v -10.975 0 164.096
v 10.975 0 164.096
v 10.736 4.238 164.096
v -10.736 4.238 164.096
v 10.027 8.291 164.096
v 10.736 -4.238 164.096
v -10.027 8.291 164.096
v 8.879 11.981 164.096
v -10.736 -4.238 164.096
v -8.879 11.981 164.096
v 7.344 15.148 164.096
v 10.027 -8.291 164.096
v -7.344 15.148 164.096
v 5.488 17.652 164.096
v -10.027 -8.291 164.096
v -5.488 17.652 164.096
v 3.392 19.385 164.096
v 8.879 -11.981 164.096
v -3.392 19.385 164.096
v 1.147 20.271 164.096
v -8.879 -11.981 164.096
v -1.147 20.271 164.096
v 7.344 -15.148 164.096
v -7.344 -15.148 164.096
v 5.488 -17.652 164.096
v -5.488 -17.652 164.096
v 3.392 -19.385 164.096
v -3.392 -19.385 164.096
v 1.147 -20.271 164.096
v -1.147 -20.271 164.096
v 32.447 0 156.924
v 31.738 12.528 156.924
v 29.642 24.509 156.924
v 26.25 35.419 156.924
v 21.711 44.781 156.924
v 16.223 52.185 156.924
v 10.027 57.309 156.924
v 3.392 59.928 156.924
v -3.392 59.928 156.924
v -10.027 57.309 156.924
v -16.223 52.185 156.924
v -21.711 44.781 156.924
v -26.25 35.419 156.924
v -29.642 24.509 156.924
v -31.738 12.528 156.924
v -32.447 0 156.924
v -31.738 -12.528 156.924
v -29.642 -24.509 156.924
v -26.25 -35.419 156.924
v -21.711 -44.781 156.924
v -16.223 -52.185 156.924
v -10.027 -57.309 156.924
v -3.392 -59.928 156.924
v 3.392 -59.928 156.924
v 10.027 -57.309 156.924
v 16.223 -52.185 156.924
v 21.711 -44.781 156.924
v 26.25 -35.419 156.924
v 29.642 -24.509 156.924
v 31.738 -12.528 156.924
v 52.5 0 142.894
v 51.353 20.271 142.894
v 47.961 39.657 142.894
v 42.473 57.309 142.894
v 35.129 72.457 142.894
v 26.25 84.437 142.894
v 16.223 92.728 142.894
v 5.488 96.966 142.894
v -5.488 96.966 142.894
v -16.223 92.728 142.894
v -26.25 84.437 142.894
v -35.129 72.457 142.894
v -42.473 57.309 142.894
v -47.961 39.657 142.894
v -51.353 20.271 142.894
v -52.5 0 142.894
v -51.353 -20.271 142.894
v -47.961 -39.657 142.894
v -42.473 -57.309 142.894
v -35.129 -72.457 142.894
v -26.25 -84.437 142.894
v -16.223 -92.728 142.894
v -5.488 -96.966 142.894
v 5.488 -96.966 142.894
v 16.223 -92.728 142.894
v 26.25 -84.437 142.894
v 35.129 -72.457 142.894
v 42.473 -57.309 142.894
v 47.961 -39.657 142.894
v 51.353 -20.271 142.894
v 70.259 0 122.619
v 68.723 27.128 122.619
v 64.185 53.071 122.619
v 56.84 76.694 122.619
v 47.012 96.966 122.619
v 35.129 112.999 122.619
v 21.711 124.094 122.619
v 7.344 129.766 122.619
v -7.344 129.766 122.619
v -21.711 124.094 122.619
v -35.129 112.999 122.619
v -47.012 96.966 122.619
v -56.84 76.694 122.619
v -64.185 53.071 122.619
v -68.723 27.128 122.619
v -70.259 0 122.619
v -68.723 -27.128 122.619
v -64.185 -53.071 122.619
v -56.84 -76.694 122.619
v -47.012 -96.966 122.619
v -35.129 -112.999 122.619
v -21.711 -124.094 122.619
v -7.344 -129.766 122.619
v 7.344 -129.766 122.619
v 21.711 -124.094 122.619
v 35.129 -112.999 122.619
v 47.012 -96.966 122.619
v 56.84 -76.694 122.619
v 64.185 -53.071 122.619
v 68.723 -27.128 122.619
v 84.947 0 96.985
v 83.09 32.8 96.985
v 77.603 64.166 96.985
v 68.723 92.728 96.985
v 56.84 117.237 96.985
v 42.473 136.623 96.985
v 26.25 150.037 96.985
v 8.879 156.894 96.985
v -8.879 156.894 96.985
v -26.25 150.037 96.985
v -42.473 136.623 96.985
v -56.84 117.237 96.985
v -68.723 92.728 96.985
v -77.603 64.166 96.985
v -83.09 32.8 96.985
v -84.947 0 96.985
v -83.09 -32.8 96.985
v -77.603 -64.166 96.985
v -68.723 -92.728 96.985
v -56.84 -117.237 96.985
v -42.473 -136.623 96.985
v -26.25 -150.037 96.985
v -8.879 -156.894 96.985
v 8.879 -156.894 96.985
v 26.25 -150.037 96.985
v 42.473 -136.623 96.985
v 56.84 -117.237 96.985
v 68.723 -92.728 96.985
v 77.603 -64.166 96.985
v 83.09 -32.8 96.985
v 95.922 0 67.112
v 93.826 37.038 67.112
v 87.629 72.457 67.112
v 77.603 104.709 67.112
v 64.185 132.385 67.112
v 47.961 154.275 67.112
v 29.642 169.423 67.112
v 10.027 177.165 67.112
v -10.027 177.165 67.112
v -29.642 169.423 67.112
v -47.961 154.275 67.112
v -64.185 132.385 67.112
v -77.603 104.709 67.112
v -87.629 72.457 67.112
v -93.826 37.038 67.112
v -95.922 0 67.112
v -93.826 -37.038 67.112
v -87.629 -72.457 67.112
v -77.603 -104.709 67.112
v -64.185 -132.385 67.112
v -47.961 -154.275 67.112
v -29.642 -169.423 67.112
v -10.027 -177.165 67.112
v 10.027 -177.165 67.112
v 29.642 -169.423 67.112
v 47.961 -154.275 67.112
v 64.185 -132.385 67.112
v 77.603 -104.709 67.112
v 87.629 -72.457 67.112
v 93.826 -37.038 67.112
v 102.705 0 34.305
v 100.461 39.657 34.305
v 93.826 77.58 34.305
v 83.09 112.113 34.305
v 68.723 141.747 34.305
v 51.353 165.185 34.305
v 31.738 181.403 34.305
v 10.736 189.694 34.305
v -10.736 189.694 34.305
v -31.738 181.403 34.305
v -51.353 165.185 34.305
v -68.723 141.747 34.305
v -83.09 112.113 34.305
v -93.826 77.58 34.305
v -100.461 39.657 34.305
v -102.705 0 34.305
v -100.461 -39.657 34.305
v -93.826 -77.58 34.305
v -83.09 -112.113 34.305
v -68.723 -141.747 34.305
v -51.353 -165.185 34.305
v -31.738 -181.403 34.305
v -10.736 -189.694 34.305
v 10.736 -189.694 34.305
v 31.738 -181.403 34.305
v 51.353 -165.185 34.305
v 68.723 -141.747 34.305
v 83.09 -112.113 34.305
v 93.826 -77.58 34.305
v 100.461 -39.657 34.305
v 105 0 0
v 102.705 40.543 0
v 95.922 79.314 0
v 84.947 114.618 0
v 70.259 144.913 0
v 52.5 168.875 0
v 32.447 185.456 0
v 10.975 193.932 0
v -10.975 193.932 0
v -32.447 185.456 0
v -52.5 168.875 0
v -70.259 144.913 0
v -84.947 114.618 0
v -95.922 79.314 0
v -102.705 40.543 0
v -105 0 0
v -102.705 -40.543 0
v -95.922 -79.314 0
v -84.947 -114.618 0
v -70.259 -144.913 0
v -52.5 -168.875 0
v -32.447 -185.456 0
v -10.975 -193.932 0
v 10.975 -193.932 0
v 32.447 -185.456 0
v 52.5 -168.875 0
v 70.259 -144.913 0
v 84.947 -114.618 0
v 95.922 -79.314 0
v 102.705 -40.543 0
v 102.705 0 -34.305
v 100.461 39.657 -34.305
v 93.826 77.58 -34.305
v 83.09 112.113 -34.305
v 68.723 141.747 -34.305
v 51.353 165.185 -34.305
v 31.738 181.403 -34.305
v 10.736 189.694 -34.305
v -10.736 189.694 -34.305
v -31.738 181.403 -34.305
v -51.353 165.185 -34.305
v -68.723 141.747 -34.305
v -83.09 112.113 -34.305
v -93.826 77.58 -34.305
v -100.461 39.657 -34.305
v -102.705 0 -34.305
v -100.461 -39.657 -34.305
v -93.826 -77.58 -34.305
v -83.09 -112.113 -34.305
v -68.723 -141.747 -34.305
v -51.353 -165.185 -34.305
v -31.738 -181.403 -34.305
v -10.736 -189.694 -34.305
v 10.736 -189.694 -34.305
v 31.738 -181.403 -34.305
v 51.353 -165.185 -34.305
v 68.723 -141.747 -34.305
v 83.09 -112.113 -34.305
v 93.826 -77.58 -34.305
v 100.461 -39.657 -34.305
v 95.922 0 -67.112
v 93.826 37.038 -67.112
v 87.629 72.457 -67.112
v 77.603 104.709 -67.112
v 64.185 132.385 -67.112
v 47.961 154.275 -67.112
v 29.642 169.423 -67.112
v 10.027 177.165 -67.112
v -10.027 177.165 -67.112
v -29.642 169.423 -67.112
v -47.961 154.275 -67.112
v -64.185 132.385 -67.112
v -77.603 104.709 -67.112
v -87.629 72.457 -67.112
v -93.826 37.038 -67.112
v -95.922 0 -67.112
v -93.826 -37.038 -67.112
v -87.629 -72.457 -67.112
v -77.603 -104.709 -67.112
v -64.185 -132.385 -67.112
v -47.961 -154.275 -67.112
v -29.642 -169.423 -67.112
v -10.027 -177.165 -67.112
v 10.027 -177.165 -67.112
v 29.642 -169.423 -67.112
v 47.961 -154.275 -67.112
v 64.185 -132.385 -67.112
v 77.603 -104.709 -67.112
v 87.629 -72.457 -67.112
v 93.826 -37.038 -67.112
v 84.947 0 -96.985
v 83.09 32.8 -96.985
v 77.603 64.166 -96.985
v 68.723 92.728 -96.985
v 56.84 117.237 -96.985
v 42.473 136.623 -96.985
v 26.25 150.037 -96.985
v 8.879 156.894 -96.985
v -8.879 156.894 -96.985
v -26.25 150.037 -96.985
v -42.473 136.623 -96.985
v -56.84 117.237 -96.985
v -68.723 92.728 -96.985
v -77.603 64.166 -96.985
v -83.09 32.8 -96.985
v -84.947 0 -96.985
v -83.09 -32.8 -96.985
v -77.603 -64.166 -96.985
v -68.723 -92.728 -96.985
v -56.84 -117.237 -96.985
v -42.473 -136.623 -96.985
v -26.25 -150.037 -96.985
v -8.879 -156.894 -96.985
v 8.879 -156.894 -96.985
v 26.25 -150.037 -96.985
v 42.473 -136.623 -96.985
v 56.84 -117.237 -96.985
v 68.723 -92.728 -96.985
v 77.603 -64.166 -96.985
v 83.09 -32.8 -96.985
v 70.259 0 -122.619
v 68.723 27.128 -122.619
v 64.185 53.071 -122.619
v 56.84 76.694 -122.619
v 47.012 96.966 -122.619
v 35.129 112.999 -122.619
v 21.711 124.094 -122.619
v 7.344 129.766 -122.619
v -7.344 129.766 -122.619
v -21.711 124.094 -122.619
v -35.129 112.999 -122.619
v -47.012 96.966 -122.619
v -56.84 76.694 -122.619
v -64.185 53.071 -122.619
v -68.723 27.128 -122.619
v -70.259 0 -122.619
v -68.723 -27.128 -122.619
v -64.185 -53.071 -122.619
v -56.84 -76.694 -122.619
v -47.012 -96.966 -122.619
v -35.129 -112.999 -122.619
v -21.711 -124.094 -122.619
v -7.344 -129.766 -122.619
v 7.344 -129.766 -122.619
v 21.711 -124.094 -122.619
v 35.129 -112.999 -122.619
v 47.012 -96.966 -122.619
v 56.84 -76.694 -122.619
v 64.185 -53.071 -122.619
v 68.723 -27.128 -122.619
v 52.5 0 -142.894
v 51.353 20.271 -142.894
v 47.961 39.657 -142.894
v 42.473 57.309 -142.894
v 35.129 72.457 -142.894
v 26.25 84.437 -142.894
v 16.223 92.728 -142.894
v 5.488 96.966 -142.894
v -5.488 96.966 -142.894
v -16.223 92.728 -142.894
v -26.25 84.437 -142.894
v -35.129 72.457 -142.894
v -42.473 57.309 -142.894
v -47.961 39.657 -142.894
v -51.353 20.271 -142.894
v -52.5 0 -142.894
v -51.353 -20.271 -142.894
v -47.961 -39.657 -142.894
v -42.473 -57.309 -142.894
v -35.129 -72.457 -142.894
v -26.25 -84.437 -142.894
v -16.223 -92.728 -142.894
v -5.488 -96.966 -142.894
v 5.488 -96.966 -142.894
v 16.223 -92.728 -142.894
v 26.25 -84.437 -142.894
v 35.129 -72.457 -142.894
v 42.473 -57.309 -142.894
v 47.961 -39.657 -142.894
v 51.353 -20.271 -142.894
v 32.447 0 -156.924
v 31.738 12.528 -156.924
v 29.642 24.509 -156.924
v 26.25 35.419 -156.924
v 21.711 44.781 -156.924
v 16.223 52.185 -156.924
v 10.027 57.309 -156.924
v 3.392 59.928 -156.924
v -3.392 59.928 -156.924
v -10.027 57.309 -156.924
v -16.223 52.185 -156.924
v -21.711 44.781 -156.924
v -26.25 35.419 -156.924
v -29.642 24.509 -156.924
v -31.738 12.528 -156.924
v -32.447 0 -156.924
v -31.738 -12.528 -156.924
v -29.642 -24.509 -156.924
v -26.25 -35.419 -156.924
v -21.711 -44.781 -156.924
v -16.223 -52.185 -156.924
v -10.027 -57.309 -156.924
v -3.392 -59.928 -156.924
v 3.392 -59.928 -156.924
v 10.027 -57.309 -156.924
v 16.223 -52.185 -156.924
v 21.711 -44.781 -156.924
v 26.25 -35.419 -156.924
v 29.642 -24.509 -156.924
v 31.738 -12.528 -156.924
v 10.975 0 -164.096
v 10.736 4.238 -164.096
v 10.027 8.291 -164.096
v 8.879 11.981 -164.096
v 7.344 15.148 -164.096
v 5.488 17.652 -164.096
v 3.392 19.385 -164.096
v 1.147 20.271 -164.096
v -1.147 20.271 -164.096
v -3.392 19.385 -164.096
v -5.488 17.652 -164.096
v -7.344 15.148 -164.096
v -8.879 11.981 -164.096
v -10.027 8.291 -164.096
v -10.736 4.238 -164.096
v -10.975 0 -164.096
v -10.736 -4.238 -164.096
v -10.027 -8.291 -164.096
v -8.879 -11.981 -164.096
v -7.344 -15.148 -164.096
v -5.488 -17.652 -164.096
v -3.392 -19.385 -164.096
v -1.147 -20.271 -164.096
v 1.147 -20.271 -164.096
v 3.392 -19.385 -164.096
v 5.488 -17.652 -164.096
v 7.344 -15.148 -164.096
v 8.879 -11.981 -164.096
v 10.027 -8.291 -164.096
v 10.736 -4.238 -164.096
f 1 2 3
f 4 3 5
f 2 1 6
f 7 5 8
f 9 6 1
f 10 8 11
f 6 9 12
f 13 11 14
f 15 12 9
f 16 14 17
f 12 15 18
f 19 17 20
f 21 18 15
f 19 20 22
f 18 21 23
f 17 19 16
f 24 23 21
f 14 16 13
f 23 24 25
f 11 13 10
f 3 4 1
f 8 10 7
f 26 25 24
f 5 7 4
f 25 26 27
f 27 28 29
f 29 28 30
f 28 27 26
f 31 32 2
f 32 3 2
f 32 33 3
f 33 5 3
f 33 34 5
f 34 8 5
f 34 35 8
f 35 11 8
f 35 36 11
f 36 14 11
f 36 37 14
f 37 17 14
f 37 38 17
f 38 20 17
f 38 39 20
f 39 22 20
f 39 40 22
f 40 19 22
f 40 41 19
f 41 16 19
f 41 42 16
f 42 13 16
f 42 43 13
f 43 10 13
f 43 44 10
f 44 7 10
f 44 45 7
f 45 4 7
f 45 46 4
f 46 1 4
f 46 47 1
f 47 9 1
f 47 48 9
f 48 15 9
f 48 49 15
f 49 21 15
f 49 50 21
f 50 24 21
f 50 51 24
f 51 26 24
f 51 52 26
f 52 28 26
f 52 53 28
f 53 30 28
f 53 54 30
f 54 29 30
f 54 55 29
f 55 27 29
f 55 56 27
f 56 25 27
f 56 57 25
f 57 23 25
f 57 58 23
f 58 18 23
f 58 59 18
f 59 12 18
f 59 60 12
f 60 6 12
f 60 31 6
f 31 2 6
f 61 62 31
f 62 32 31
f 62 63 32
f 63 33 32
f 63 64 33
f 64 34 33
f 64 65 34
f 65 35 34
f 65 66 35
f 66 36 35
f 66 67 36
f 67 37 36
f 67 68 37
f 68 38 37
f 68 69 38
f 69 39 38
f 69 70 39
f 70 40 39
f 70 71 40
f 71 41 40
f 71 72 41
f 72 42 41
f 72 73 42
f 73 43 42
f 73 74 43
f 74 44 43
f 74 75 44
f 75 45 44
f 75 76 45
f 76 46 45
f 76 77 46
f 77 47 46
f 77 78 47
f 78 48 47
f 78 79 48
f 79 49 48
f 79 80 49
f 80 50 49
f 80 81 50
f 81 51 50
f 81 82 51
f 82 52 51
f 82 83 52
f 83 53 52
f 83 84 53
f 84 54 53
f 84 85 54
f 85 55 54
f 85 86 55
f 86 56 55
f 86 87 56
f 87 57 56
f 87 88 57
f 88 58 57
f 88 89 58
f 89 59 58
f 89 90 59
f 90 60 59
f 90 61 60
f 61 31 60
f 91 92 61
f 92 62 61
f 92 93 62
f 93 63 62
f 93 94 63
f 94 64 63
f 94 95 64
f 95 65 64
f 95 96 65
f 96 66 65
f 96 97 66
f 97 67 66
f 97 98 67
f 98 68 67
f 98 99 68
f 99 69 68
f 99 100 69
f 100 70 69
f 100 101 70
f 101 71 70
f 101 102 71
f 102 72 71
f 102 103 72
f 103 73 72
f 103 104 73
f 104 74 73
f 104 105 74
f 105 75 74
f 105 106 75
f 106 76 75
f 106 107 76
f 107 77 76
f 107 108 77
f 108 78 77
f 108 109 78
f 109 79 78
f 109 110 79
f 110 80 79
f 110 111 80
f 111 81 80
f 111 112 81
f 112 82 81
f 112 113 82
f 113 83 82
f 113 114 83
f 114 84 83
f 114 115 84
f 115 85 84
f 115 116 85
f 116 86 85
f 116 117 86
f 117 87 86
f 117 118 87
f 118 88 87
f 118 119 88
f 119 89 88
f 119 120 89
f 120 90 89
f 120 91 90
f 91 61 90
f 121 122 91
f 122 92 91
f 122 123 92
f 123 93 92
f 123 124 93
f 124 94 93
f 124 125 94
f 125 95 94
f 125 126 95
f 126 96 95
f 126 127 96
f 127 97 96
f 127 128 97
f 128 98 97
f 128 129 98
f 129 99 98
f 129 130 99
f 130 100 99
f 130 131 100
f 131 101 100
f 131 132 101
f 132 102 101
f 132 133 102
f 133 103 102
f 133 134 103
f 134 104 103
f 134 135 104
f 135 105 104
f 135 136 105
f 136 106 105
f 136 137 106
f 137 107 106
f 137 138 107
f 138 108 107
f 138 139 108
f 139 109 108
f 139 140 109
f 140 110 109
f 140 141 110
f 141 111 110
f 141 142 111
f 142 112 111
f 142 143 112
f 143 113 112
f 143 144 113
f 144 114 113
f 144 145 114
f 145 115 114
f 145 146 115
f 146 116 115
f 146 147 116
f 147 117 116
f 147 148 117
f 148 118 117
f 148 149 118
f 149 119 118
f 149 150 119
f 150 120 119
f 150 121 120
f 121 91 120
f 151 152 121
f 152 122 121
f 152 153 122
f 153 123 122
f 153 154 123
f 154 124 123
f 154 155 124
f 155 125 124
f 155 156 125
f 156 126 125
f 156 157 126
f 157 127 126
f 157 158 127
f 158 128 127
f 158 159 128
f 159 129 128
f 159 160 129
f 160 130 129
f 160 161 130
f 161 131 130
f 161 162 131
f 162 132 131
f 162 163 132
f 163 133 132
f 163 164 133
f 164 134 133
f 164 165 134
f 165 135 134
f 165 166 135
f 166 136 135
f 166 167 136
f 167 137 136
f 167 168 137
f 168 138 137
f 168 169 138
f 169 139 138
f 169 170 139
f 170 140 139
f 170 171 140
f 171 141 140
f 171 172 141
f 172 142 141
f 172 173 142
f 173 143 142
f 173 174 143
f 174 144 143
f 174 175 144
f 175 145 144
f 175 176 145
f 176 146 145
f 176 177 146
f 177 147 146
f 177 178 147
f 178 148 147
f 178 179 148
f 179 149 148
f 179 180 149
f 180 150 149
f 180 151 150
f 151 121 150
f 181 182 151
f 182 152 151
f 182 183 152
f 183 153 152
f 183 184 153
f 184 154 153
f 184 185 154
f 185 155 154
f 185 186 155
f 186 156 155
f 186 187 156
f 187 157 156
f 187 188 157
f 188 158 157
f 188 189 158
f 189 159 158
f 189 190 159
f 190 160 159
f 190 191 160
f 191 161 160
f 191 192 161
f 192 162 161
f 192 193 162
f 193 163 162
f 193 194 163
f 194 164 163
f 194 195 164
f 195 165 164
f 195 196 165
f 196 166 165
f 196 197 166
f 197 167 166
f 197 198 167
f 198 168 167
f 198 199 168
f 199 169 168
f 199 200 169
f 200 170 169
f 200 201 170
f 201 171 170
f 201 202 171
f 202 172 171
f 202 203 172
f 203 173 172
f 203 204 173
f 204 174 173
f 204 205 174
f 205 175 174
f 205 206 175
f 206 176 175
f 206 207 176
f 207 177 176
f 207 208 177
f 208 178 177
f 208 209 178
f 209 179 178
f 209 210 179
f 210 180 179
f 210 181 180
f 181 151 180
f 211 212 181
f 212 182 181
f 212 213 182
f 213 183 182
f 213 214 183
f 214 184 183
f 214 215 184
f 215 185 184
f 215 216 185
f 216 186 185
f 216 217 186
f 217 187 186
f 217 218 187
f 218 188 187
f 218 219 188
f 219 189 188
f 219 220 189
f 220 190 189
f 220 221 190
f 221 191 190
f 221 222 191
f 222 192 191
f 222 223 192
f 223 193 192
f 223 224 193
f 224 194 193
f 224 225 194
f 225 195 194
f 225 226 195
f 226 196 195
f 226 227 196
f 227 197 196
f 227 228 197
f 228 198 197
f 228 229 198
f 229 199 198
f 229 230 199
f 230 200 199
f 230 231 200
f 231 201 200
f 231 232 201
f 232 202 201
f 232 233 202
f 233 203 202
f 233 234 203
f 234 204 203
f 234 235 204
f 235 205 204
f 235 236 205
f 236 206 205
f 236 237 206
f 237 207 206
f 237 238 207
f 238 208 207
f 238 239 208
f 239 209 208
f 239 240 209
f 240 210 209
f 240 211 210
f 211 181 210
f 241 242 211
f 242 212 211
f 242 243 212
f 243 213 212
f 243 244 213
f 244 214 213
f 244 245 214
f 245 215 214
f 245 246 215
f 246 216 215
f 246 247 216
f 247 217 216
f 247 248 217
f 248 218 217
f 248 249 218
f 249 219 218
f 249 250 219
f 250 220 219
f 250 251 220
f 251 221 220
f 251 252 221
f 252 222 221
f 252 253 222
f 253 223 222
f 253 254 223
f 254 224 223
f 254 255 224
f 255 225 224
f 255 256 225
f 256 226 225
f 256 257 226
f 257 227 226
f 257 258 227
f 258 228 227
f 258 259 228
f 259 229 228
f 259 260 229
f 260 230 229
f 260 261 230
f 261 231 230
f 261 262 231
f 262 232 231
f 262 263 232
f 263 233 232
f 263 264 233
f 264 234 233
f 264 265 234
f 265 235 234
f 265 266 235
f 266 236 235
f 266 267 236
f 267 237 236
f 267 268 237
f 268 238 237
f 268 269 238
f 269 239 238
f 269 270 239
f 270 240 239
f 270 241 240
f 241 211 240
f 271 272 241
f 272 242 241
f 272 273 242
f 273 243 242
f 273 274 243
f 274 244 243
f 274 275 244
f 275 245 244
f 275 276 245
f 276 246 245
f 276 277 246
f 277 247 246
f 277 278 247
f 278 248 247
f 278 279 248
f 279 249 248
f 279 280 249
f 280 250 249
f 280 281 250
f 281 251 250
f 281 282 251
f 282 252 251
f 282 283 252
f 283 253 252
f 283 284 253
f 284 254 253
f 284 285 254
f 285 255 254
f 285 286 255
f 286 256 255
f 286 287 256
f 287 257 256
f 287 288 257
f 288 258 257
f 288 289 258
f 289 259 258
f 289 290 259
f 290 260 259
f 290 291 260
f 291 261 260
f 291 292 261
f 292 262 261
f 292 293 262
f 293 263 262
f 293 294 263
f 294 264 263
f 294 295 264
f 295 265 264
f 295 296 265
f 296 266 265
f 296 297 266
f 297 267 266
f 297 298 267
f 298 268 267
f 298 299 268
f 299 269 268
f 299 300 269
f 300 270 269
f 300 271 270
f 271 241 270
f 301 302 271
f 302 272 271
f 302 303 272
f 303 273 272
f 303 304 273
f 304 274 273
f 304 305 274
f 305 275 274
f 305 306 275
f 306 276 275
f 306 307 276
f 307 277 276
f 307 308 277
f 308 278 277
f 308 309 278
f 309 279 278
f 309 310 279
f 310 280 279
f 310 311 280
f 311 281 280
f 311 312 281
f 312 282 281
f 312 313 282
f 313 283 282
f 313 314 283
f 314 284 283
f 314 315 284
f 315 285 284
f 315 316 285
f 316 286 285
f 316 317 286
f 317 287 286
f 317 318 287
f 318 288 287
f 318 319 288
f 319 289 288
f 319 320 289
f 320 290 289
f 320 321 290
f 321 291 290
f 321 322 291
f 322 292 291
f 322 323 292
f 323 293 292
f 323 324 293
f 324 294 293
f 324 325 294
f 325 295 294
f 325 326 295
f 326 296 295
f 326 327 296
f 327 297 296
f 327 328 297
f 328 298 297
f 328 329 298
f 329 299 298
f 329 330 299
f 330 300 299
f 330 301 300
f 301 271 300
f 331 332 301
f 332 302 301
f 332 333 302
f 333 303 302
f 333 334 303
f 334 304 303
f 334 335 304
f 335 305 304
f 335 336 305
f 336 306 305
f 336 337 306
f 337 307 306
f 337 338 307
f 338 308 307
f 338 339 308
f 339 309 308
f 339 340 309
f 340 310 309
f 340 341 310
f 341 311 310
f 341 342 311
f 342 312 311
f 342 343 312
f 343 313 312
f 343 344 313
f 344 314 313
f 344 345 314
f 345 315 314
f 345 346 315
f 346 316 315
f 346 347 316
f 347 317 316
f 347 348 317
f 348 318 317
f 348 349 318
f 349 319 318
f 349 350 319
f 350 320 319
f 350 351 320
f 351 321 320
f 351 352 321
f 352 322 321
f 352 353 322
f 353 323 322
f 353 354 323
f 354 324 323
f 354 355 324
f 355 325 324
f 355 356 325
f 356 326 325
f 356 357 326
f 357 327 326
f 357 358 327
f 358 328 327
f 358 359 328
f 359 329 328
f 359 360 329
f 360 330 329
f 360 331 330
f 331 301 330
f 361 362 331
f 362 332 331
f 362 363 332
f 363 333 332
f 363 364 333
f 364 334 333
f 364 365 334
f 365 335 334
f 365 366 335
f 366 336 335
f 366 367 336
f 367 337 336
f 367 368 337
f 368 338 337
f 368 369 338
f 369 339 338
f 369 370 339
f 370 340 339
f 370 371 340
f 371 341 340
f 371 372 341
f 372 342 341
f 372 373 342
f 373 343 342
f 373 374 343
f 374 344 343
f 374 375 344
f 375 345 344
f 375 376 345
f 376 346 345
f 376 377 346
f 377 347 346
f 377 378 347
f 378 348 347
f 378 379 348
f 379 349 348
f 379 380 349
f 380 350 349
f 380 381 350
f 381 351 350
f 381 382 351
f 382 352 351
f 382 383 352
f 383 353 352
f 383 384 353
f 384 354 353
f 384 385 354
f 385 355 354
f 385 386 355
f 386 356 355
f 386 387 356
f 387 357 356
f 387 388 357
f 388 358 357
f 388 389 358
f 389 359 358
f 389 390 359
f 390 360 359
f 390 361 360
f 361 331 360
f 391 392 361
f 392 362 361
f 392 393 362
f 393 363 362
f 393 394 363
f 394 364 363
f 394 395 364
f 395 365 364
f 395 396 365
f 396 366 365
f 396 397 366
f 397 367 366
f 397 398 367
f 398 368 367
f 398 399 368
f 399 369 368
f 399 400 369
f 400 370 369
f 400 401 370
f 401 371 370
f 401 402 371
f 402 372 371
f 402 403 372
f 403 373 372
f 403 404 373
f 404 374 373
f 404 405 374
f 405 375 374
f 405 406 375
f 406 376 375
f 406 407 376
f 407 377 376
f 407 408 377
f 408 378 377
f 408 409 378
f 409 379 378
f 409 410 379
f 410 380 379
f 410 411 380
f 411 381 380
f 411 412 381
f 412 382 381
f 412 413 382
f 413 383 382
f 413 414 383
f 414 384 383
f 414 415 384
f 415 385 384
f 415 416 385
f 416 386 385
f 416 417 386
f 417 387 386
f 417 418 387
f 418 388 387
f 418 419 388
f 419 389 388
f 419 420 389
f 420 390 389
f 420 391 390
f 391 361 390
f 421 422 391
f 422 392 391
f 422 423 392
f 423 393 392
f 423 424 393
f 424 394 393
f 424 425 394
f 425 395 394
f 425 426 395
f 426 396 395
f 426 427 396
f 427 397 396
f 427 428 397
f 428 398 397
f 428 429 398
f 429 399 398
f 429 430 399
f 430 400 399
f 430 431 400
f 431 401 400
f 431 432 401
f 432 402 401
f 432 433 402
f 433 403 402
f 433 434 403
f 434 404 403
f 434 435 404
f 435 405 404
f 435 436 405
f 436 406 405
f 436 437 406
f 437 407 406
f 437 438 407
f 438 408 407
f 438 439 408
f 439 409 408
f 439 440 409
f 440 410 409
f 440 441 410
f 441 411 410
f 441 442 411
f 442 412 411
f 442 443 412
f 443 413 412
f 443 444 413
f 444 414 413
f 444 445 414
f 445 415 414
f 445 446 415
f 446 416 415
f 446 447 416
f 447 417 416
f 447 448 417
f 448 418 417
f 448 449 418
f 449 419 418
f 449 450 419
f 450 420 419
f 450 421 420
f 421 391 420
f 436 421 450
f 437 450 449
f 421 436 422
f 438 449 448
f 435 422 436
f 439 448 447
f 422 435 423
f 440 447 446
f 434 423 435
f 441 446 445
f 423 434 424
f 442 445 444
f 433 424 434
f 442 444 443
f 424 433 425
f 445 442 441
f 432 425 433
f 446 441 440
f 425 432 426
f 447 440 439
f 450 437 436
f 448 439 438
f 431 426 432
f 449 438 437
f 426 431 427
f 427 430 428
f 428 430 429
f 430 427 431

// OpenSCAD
// Generated by SolidPython 1.0.1 on 2020-07-29 00:46:47


scale(v = [7, 13, 11]) {
	sphere(r = 15);
}
/***********************************************
*********      SolidPython code:      **********
************************************************
 
# import packages: SolidPython
from solid import *
from solid.utils import *
from itertools import chain, combinations, permutations


class Resize:

    def __init__(self, scad_file):
        self.scad_file = scad_file
        #self.scad_file = import_scad(scad_file)
        # cone/cylinder param:
        self.r1 = 0
        self.r2 = 0
        self.h = 0
        # rectangular prism param:
        self.w = 0
        self.l = 0
        # ellipse param:
        self.r = 0

    # import OpenScad code (file name corresponds to shape)


    # classify shape + parameters
    def assign(self, param1, param2, param3):
        if self.scad_file == 'cone.scad':
            self.r1 = param1
            self.r2 = param2
            self.h = param3
        elif self.scad_file == 'cylinder.scad':
            self.r1 = param1
            self.r2 = param2
            self.h = param3
        elif self.scad_file == 'rectangularPrism.scad':
            self.h = param1
            self.l = param2
            self.w = param3
        else:
            self.r = param1
            self.h = param2

    # resize parameters
    def iterate(self):
        x = range(3, 20, 2)
        i = 1
        if self.scad_file == 'cone.scad':
            tempList = list(permutations(x, 2))
            for temp in tempList:
                param1 = temp[0]
                param2 = temp[1]
                filepath = 'produced_scad_files/' + 'cone' + str(param1) + '_' + str(param2) + '_' + '.scad'
                scad_render_to_file(cylinder(h=param1, r1=param2, r2=0), filepath)

        elif self.scad_file == 'cylinder.scad':
            tempList = list(permutations(x, 3))
            for temp in tempList:
                param1 = temp[0]
                param2 = temp[1]
                filepath = 'produced_scad_files/' + 'cylinder' + str(param1) + '_' + str(param2) + '_' + '.scad'
                scad_render_to_file(cylinder(h=param1, r1=param2, r2=param2), filepath)

        elif self.scad_file == 'rectangularPrism.scad':
            tempList = list(permutations(x, 3))
            for temp in tempList:
                param1 = temp[0]
                param2 = temp[1]
                param3 = temp[2]
                filepath = 'produced_scad_files/' + 'rectangularPrism' + str(param1) + '_' + str(param2) + '_' + str(
                    param3) + '.scad'
                scad_render_to_file(cube(size=(param1, param2, param3)), filepath)

        elif self.scad_file == 'ellipse.scad':
            tempList = list(permutations(x, 4))
            for temp in tempList:
                param1 = temp[0]
                param2 = temp[1]
                param3 = temp[2]
                param4 = temp[3]
                filepath = 'produced_scad_files/' + 'ellipse' + str(param1) + '_' + str(param2) + '_' + str(param3) + '_' + str(param4) + '.scad'
                scad_render_to_file(scale([param1, param2, param3])(sphere(r=param4)), filepath)

    def render_to_scadfile(self):
        scad_render_to_file(scad, 'example.scad') 
 
************************************************/
